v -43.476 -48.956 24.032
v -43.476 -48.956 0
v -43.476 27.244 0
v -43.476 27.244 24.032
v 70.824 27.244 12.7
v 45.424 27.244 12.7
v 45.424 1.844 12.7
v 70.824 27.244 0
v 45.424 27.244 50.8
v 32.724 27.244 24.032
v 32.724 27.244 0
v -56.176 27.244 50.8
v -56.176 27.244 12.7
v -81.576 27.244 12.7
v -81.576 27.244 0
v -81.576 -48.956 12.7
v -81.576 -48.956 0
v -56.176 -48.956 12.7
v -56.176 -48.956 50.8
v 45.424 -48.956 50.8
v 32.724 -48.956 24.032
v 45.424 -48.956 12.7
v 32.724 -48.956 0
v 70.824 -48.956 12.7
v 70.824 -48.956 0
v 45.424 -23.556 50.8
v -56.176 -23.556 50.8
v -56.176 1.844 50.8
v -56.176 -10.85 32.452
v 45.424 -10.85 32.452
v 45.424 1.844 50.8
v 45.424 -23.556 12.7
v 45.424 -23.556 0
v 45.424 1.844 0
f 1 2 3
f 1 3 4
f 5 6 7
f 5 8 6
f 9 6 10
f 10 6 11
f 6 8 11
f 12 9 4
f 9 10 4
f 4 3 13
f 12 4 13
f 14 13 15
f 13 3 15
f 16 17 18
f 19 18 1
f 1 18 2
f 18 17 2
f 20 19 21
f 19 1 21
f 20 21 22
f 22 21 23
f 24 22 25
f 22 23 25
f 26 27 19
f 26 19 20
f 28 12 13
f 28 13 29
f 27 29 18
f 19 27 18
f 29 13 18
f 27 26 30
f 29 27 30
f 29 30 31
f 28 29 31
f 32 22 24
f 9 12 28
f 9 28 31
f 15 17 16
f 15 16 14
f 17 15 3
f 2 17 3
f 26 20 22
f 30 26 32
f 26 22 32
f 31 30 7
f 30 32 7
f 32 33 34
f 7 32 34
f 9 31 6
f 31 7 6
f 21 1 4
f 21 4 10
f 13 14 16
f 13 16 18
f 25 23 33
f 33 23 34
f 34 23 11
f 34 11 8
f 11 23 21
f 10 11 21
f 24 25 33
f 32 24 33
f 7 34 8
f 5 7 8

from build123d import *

# Parameters (mm, degrees)
F0_W     = 25.4
F0_H     = 76.2
F1_DEPTH = 12.7
F2_DEPTH = 50.8
F3_DEPTH = 12.7
F5_DEPTH = 127.001
F6_W     = 76.2
F6_H     = 24.031783
F7_DEPTH = 76.201


with BuildPart() as f1:
    # F0 (on Top) → F1 (new body)
    with BuildSketch(Plane.XY):
        with Locations((-68.876286, -10.856101)):
            Rectangle(F0_W, F0_H)
    extrude(amount=F1_DEPTH)

    # F0 (on Top) → F2 (join)
    with BuildSketch(Plane.XY):
        Polygon((45.423714, 27.243899), (-56.176286, 27.243899), (-56.176286, -48.956101), (45.423714, -48.956101), (45.423714, -23.556101), (45.423714, 1.843899), align=None)
    extrude(amount=F2_DEPTH)

    # F0 (on Top) → F3 (join)
    with BuildSketch(Plane.XY):
        Polygon((70.823714, 27.243899), (45.423714, 27.243899), (45.423714, 1.843899), align=None)
        Polygon((45.423714, -23.556101), (45.423714, -48.956101), (70.823714, -48.956101), align=None)
    extrude(amount=F3_DEPTH)

    # F4 (on face) → F5 (cut, through all)
    with BuildSketch(Plane.YZ.offset(45.423714)):
        Polygon((-10.849641, 32.451563), (1.843899, 50.8), (-23.556101, 50.8), align=None)
    extrude(amount=-F5_DEPTH, mode=Mode.SUBTRACT)

    # F6 (on face) → F7 (cut, through all)
    with BuildSketch(Plane.XZ.offset(48.956101)):
        with Locations((-5.376286, 12.015891)):
            Rectangle(F6_W, F6_H)
    extrude(amount=-F7_DEPTH, mode=Mode.SUBTRACT)


solid = f1.part
